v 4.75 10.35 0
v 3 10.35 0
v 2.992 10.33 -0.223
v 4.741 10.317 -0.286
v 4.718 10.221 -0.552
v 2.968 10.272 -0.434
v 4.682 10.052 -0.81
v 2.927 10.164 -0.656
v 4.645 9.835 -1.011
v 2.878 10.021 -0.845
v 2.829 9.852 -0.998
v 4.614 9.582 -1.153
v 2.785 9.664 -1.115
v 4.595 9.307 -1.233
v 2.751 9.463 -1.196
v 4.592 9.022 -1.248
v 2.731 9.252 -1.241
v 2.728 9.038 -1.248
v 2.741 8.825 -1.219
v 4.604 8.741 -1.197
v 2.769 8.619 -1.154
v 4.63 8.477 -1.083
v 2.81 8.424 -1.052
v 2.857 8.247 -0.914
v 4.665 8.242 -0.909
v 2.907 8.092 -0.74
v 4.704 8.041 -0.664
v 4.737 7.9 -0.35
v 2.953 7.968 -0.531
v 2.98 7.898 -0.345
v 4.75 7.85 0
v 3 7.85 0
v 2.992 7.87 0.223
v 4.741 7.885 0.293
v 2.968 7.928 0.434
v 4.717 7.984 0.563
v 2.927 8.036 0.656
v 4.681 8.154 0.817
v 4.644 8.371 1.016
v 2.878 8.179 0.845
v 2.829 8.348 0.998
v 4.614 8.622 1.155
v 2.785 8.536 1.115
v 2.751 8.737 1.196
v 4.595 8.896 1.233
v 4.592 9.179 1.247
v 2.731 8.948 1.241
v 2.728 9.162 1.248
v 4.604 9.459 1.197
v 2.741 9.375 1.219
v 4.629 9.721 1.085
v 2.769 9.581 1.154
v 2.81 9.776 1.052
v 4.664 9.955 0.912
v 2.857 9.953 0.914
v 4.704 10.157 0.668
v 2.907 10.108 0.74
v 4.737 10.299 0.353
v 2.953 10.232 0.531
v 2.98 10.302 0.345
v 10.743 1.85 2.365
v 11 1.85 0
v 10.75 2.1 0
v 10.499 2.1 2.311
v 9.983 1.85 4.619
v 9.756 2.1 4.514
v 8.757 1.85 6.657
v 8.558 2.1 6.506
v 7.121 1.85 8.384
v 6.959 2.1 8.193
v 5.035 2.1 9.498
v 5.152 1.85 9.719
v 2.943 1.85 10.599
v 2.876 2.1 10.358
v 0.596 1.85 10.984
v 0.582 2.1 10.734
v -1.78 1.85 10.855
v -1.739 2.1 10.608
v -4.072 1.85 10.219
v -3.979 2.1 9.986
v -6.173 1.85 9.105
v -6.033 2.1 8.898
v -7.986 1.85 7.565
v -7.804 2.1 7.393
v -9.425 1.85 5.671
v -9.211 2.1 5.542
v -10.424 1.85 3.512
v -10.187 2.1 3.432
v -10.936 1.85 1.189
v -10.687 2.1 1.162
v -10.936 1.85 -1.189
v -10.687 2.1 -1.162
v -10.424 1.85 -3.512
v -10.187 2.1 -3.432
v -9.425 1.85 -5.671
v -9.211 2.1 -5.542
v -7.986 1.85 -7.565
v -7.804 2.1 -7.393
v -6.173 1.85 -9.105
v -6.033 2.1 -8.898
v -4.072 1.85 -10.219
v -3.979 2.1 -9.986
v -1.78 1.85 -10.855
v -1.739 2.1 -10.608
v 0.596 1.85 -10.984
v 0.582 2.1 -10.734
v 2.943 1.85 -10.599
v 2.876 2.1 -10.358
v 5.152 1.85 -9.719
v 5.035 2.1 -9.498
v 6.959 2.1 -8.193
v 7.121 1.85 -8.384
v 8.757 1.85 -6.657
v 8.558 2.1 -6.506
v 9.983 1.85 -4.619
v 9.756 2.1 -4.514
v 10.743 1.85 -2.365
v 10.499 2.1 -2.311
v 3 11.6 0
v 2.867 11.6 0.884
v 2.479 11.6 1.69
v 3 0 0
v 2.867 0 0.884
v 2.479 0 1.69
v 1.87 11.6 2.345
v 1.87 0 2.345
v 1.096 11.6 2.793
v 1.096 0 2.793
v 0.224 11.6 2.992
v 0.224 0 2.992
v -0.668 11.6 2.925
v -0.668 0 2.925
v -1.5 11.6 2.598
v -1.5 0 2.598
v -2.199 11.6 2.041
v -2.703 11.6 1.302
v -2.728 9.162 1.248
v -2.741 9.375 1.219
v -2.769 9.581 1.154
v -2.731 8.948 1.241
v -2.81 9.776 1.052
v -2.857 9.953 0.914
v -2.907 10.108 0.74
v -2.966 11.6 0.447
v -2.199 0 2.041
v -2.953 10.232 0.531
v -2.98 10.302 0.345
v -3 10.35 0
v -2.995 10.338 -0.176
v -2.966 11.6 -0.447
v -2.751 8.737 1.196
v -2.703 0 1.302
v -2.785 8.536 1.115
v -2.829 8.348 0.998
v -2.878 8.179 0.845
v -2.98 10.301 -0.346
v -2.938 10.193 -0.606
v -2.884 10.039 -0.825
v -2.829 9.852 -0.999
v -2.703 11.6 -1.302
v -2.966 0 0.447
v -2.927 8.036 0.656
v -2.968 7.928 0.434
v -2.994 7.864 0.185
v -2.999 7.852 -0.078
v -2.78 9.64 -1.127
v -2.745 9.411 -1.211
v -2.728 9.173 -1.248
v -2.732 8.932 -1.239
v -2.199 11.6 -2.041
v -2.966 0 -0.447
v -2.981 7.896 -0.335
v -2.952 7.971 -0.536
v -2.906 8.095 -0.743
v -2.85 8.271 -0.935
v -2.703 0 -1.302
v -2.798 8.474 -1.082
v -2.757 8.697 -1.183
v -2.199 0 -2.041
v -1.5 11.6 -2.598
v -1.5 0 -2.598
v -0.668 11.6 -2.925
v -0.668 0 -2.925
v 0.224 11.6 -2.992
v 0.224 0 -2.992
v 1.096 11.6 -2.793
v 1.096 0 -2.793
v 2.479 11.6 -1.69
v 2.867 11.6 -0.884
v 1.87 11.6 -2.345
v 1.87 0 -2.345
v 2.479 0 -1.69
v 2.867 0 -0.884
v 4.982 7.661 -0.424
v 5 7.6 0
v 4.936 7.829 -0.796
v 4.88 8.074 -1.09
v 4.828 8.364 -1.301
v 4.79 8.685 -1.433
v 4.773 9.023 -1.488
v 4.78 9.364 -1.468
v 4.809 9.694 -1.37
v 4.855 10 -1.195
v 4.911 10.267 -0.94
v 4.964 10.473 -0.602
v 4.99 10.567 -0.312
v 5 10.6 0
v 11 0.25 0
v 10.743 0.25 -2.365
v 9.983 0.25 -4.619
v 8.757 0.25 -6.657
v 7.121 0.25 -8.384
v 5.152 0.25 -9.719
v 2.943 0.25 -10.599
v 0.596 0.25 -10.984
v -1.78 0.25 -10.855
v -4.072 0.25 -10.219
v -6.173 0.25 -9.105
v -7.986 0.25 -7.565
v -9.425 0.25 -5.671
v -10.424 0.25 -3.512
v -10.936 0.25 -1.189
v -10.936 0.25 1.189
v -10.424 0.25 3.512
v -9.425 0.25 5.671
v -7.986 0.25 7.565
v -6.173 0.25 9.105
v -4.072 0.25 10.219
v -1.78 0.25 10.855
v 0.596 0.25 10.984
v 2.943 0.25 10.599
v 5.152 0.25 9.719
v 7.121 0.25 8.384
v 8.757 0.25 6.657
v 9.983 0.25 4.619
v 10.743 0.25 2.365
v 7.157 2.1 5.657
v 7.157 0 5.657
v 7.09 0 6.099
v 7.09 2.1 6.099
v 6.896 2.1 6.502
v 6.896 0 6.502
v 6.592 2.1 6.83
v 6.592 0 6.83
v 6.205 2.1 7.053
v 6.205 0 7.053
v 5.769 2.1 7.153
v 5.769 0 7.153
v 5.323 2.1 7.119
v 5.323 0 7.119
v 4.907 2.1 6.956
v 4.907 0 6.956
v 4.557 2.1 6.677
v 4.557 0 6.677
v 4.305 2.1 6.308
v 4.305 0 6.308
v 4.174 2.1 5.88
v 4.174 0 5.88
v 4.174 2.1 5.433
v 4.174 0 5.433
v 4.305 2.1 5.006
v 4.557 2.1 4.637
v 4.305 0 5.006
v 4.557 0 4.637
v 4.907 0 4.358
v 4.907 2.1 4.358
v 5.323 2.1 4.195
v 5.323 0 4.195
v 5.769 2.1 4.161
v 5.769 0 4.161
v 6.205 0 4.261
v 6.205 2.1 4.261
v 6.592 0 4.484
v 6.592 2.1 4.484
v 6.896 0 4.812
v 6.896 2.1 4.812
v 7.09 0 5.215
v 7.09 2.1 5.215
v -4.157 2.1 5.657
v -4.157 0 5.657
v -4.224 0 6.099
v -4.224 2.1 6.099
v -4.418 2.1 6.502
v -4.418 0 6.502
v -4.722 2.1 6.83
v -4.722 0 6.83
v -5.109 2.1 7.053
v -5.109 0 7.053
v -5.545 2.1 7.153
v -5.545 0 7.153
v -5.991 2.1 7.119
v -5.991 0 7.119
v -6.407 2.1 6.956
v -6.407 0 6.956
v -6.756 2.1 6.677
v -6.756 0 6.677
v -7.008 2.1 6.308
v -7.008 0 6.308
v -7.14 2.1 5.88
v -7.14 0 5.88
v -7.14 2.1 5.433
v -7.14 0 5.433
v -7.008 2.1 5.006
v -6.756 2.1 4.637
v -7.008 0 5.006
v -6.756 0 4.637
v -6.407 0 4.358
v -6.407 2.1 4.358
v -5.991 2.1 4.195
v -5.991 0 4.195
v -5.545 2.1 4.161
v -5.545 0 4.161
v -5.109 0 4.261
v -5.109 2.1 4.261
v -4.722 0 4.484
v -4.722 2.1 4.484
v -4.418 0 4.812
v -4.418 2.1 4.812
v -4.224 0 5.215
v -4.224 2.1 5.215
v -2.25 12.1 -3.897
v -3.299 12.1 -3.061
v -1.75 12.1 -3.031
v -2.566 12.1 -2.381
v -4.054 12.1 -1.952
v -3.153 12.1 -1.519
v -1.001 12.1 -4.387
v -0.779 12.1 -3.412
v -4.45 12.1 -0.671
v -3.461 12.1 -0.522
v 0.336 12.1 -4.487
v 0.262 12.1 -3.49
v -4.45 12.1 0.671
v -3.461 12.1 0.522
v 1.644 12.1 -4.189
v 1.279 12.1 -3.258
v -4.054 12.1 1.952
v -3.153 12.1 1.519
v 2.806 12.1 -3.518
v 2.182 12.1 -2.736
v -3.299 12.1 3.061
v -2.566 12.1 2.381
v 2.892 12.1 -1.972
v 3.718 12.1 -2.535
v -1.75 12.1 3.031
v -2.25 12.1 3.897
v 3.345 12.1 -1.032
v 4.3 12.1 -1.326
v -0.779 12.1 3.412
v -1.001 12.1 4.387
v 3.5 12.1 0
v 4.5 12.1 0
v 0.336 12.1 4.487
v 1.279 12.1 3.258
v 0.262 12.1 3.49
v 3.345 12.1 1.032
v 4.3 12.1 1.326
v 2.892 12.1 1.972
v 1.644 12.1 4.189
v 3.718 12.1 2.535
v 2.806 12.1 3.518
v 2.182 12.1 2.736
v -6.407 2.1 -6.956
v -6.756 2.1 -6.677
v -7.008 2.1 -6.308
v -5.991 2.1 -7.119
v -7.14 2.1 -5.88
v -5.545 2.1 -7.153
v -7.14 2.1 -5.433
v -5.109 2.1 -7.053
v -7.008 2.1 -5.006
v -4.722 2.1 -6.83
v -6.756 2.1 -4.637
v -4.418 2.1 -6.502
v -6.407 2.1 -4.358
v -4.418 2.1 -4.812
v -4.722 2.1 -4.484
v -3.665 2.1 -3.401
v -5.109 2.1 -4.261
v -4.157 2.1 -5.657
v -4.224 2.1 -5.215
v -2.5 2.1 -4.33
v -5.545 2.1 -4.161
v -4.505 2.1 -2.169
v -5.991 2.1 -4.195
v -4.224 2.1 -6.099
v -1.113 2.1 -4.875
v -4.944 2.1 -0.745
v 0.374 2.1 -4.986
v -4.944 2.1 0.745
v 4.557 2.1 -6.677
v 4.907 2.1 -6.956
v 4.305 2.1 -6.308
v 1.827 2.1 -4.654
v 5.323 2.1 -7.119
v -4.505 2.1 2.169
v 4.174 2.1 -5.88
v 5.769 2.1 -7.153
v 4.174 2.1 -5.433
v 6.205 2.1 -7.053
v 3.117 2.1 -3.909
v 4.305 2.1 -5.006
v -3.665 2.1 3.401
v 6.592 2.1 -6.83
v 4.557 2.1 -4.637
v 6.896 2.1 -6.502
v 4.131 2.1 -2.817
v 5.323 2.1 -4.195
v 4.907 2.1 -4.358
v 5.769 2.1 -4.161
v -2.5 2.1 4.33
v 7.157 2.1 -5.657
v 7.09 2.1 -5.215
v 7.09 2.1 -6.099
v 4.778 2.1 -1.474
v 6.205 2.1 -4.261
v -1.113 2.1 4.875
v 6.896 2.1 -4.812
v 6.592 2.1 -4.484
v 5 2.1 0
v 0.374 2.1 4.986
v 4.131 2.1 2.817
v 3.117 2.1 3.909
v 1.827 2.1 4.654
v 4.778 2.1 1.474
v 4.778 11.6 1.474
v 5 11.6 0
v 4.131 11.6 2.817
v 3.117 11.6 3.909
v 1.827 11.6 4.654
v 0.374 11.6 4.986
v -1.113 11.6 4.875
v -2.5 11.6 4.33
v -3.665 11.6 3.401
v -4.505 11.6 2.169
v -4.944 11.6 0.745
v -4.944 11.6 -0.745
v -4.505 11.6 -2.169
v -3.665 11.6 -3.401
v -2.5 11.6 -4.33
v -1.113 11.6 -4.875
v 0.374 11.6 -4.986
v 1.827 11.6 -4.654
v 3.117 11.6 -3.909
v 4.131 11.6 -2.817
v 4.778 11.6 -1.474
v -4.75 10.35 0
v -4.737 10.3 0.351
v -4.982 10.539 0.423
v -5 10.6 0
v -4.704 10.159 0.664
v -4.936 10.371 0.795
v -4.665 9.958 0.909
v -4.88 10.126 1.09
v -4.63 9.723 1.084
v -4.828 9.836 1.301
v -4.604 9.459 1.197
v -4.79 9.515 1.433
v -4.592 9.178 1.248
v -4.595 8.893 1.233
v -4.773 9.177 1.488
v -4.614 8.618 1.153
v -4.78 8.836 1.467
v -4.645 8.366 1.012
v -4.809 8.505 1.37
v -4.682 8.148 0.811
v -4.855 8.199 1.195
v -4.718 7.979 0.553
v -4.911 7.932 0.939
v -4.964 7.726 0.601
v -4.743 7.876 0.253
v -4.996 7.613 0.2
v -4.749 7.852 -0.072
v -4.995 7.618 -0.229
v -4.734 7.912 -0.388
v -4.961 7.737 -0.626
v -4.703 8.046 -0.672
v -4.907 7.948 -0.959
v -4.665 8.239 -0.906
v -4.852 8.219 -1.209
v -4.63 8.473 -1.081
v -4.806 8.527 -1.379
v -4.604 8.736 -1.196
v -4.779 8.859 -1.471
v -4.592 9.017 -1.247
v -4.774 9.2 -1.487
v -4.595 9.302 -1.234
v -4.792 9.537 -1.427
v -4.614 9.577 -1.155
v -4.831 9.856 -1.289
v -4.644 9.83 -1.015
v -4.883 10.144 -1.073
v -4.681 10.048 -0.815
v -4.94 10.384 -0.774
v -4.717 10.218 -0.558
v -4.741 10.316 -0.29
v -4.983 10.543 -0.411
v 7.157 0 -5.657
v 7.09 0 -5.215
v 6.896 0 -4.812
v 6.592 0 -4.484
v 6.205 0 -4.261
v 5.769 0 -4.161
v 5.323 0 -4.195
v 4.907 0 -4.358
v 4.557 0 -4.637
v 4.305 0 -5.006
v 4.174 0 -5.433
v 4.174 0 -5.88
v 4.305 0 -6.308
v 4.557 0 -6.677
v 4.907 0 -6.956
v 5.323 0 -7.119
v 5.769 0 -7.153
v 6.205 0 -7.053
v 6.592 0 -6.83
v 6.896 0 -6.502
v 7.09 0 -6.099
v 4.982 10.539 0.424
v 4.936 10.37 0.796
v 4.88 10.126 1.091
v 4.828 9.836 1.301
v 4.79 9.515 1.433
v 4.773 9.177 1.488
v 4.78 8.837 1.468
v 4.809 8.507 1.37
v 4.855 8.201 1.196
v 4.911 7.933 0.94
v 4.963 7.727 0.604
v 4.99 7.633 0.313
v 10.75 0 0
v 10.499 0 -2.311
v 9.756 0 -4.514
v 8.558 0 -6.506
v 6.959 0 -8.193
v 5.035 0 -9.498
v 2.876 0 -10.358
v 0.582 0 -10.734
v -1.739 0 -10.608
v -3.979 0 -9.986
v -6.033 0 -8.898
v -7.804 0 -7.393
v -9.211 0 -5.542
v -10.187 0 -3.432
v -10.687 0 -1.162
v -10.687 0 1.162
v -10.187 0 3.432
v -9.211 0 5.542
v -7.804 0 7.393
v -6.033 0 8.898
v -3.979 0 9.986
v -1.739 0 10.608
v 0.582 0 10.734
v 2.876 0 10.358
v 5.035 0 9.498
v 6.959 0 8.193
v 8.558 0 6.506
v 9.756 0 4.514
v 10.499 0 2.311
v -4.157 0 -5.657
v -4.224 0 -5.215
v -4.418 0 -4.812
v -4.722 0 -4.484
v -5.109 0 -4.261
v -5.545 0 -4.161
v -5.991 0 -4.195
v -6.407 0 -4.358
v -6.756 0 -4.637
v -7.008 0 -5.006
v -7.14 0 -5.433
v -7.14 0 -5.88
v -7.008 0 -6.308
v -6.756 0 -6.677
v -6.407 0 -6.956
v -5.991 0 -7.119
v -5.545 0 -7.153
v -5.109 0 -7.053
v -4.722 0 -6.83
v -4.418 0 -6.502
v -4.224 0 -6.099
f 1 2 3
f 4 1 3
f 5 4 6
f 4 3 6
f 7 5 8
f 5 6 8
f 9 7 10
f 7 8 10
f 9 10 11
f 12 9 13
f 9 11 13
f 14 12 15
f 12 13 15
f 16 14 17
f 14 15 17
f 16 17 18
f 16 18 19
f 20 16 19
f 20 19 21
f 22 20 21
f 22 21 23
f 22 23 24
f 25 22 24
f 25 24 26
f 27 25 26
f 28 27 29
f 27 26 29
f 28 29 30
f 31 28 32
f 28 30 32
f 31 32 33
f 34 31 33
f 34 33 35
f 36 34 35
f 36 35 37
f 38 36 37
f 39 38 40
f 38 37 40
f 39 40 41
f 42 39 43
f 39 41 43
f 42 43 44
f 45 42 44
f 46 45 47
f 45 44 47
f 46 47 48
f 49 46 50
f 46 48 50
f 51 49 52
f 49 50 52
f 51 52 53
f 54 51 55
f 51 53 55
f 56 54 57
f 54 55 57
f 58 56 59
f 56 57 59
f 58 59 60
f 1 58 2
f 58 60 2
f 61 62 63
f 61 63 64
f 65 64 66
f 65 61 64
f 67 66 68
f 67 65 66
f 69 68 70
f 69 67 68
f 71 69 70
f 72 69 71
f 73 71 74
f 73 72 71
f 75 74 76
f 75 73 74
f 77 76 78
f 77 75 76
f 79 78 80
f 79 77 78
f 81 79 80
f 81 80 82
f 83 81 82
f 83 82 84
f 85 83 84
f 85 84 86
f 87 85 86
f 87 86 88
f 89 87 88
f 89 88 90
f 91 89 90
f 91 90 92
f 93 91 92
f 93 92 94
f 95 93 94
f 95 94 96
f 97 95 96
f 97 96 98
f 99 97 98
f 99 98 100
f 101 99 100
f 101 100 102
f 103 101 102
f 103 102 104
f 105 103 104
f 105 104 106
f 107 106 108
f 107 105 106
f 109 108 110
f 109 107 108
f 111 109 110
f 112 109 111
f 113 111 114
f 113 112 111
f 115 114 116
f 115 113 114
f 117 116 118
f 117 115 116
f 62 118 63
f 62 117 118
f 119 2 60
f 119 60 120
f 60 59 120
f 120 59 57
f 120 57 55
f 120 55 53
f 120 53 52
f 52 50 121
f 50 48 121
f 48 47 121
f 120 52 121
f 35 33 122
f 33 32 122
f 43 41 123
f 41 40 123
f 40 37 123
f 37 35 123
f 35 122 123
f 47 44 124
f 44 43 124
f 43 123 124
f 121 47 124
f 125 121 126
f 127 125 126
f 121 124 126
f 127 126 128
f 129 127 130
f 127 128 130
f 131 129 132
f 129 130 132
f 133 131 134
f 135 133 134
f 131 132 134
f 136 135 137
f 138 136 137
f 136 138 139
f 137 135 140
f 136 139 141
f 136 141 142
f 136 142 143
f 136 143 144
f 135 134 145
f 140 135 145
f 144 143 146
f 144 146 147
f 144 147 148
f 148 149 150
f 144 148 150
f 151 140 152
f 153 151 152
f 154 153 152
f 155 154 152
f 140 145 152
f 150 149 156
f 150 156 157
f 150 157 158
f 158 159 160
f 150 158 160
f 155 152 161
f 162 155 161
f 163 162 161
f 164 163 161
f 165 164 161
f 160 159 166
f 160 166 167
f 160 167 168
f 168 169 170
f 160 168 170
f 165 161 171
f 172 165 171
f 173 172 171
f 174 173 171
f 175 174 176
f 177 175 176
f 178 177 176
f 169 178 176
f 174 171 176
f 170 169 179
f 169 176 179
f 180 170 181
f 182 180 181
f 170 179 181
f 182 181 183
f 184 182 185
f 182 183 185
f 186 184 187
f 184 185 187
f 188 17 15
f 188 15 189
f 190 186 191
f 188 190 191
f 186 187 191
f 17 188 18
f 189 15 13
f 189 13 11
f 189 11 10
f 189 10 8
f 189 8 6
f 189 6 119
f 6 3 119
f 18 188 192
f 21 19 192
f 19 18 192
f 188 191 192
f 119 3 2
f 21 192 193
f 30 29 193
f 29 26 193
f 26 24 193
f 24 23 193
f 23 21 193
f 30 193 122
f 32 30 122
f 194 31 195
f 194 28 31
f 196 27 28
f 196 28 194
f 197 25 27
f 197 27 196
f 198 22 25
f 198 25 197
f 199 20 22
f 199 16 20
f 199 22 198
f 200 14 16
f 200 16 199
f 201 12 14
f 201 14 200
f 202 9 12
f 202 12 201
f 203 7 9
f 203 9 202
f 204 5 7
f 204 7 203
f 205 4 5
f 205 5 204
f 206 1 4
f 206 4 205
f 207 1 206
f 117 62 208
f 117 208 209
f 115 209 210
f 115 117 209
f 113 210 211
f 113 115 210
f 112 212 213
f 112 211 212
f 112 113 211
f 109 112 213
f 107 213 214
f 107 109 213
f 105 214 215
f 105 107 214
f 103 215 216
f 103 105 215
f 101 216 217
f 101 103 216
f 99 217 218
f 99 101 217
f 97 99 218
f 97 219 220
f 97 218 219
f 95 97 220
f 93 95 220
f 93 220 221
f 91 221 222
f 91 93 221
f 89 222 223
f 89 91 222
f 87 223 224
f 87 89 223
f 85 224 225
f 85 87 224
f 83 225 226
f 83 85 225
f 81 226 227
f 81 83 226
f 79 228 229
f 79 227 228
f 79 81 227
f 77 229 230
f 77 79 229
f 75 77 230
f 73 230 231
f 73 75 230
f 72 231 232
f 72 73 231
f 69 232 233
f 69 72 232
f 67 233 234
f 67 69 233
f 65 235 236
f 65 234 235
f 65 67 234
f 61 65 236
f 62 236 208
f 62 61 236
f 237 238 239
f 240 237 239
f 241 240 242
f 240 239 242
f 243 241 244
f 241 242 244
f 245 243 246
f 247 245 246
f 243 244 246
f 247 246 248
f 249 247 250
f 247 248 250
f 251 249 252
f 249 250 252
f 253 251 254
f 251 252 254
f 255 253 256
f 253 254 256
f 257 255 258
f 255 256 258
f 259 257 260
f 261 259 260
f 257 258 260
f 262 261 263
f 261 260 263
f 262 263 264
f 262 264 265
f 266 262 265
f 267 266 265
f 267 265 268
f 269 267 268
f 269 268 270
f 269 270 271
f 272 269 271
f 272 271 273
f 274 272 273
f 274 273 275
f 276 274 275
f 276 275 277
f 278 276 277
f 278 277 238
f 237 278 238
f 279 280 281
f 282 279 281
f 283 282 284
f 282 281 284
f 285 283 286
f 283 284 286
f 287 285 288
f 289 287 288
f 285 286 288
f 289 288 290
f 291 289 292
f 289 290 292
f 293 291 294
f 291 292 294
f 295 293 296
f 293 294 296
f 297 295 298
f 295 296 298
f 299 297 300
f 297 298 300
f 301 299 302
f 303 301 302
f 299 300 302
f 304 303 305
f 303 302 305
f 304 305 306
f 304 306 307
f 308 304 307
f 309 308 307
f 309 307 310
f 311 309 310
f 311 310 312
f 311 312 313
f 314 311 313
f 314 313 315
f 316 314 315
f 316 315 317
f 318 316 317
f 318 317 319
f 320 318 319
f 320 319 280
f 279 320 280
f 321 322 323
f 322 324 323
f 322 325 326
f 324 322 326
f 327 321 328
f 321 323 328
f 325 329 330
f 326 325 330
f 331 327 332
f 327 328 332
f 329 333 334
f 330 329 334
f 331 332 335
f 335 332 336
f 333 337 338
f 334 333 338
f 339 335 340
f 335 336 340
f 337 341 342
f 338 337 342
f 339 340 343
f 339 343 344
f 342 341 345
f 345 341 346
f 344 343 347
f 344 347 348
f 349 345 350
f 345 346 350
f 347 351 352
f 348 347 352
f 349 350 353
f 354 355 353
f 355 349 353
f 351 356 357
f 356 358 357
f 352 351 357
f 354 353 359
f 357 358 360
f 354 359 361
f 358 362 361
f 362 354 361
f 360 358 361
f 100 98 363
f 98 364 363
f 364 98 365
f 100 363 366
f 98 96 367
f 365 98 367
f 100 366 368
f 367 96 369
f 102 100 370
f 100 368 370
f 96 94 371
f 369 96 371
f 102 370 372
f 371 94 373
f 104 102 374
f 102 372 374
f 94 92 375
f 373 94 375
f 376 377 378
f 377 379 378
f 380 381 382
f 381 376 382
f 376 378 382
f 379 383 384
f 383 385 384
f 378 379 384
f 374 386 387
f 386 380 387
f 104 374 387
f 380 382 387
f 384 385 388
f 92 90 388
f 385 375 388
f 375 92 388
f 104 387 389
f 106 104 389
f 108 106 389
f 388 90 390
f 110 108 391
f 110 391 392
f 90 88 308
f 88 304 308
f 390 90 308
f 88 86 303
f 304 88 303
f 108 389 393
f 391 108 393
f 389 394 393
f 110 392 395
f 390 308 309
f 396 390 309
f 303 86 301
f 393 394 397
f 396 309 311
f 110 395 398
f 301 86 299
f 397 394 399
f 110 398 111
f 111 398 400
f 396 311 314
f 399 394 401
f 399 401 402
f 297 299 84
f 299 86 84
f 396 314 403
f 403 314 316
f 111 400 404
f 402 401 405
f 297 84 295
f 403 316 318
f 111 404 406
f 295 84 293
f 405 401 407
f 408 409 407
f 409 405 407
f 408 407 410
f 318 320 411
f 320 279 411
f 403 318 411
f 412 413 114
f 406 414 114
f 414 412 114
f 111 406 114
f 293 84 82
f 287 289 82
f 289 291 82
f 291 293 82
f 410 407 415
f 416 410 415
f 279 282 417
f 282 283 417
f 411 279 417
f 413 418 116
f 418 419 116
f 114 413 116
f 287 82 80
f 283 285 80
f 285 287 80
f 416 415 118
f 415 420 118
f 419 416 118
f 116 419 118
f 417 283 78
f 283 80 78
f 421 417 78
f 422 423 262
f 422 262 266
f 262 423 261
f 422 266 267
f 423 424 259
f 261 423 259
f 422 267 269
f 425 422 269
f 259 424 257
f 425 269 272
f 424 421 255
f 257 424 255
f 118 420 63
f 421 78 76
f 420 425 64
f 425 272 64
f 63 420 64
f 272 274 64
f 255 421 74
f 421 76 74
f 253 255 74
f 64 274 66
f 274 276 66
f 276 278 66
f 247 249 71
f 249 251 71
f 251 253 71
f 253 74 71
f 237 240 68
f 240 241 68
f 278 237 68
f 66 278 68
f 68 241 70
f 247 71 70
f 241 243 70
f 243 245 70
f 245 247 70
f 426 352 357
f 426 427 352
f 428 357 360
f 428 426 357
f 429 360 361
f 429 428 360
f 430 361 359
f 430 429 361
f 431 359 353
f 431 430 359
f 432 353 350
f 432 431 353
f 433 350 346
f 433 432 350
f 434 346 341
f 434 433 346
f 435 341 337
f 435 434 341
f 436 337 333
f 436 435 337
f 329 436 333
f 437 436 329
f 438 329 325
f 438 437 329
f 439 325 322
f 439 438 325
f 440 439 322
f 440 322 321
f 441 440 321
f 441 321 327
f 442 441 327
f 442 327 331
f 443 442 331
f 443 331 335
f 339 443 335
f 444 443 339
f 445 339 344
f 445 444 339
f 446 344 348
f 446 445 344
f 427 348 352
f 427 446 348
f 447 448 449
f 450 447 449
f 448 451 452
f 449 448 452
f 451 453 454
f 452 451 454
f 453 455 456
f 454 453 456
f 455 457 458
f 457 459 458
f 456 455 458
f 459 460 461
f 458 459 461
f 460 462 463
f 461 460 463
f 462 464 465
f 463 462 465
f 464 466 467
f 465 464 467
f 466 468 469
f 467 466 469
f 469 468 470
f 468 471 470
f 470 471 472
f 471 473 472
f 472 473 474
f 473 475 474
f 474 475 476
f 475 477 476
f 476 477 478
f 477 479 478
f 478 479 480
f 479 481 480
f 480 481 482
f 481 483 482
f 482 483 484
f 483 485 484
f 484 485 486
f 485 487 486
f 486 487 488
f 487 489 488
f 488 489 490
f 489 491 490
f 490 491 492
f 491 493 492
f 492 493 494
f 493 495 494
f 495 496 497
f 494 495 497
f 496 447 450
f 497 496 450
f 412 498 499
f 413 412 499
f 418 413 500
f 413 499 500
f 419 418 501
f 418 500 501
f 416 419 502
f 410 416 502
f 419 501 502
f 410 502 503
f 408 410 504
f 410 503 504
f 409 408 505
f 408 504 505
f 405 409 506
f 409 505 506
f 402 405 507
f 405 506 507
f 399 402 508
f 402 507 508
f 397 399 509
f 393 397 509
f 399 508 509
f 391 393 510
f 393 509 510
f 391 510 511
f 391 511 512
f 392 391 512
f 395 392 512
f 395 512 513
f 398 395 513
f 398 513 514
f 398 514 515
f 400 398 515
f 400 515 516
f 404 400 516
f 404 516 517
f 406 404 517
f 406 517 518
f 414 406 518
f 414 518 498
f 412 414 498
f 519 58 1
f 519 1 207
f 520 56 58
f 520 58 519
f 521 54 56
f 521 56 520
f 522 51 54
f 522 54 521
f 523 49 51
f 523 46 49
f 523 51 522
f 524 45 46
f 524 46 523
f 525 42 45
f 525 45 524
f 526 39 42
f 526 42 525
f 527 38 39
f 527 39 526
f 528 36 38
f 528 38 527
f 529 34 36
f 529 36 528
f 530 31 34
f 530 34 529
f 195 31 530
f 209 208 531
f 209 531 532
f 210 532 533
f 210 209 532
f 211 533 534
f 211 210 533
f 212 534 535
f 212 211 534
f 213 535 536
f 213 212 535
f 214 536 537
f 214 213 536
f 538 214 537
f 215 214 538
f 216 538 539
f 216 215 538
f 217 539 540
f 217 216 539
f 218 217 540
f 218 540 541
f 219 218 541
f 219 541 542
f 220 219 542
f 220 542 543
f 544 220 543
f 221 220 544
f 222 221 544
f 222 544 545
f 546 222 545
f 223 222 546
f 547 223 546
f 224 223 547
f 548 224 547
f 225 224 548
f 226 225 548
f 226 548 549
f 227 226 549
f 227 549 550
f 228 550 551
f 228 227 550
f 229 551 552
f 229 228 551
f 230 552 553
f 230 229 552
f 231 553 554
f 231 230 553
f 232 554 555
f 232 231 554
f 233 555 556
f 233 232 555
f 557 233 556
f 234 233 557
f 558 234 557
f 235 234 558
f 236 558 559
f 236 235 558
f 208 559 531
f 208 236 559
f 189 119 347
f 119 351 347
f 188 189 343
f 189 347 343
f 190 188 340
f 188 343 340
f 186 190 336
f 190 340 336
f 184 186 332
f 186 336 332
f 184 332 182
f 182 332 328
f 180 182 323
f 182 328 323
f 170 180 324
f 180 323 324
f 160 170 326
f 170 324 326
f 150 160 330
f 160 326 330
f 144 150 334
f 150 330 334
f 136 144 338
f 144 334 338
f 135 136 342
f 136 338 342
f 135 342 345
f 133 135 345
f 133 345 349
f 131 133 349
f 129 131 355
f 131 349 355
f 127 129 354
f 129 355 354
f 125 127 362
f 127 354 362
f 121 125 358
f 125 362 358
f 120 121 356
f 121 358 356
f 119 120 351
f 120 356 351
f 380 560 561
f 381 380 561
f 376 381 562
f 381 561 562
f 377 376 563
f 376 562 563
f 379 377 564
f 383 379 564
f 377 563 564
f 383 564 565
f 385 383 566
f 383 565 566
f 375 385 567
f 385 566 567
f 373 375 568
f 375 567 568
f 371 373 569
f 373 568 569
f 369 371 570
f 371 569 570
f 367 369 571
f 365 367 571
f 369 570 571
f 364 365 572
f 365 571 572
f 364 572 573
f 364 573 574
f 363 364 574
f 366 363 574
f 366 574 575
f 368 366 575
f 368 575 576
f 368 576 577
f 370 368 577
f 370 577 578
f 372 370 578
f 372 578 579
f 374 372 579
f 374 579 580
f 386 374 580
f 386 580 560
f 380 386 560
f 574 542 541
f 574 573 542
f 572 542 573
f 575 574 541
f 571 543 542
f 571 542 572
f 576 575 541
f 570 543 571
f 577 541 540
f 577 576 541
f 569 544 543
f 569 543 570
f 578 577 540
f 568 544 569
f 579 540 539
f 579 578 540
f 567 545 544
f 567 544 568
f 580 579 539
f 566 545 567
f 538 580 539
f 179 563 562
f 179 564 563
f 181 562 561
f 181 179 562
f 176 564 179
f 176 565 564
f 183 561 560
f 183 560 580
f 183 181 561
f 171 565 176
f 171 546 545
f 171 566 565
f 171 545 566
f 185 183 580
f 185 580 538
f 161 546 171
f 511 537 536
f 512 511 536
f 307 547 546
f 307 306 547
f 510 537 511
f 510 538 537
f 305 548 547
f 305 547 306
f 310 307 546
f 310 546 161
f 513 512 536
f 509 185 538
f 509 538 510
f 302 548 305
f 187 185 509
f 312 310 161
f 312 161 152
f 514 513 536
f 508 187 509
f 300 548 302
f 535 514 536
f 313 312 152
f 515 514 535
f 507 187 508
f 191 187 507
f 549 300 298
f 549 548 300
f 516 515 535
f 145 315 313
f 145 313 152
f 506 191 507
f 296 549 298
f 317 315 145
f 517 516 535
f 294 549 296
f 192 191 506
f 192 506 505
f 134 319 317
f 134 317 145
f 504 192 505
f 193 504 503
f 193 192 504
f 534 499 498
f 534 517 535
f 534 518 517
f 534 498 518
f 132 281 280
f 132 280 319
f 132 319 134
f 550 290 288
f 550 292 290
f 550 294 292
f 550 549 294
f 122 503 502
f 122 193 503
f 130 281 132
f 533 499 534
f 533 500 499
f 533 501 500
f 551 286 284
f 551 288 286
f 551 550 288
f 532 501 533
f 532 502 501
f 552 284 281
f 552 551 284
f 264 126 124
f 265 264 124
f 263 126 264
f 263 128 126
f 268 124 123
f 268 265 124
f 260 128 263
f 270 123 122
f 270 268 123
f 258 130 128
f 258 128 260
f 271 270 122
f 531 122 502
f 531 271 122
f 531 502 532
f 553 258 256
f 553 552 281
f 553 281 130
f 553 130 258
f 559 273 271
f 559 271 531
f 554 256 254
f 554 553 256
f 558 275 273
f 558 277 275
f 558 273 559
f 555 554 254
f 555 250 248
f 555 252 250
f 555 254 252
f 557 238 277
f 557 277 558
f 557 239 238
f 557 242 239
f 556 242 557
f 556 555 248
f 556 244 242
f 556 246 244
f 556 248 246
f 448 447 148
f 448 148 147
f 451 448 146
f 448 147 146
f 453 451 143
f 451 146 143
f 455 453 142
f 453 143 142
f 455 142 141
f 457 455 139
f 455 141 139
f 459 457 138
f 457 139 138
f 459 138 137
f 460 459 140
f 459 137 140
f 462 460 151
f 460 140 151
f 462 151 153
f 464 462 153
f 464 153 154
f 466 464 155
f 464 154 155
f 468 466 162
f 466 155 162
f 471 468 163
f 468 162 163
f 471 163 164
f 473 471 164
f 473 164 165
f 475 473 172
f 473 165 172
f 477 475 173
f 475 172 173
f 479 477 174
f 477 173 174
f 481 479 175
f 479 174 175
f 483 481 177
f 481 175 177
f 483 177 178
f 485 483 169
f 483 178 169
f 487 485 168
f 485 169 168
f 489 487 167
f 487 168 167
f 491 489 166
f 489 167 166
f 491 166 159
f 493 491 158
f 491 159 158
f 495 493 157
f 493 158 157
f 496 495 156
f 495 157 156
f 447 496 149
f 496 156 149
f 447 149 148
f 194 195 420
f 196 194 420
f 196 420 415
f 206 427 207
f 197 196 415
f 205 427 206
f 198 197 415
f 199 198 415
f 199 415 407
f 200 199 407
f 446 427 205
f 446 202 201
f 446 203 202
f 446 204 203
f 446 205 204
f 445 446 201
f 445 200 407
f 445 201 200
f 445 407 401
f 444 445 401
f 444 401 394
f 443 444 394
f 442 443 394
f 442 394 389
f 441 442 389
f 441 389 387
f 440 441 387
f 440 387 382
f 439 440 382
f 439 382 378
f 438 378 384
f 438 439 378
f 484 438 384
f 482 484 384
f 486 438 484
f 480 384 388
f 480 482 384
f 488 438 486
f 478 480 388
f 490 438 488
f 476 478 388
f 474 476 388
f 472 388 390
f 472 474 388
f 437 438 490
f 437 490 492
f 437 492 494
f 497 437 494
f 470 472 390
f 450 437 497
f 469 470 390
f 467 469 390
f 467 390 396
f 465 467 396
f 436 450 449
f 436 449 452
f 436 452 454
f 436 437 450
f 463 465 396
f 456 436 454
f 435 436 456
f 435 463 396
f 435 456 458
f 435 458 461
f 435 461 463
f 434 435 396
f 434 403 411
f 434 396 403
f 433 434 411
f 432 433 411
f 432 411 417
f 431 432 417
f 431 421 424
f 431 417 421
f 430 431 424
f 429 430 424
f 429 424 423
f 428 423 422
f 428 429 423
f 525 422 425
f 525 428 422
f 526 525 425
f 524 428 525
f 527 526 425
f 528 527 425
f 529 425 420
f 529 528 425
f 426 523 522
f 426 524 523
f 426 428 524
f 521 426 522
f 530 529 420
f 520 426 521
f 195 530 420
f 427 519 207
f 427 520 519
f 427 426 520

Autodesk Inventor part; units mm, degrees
ref_plane "YZ Plane" through (0, 0, 0) normal (1, 0, 0) x (0, 1, 0)
ref_plane "XZ Plane" through (0, 0, 0) normal (0, 1, 0) x (-1, 0, 0)
ref_plane "XY Plane" through (0, 0, 0) normal (0, 0, 1) x (1, 0, 0)
sketch "Sketch1" plane through (0, 0, 0) normal (0, 0, 1) x (1, 0, 0)
  line L0 (0, 0) -> (11, 0)
  line L1 (11, 0) -> (11, 2.1)
  line L2 (11, 2.1) -> (0, 2.1)
  line L3 (0, 2.1) -> (0, 0)
  line L4 (0, 0) -> (5, 0)
  line L5 (5, 0) -> (5, 12.1)
  line L6 (5, 12.1) -> (0, 12.1)
  line L7 (0, 12.1) -> (0, 0)
  line L8 (0, 12.1) -> (3, 12.1)
  line L9 (3, 12.1) -> (3, 0)
  line L10 (3, 0) -> (0, 0)
  line L11 (0, 0) -> (0, 12.1)
  point P0 (3, 0)
  point P1 (5, 2.1)
  dimension "d0" = 11
  dimension "d1" = 2.1
  dimension "d2" = 5
  dimension "d3" = 12.1
  dimension "d4" = 3
revolve "Revolution1" add sketch "Sketch1" angle 360 about axis through (0, 12.1, 0) along (0, -1, 0) contours L9 L2 L5 L0 | L5 L2 L1 L0 | L9 L6 L5 L2
sketch "Sketch2" plane through (0, 0, 0) normal (0, -1, 0) x (1, 0, 0)
  circle A0 centre (0, 0) radius 8 construction
  line L0 (0, 0) -> (8, 0) construction
  circle A1 centre (8, 0) radius 1.5
  circle A2 centre (5.6569, 5.6569) radius 1.5
  circle A3 centre (0, 8) radius 1.5
  circle A4 centre (-5.6569, 5.6569) radius 1.5
  circle A5 centre (-8, 0) radius 1.5
  circle A6 centre (-5.6569, -5.6569) radius 1.5
  circle A7 centre (0, -8) radius 1.5
  circle A8 centre (5.6569, -5.6569) radius 1.5
  dimension "d6" = 16
  dimension "d7" = 3
  dimension "d10" = 360
extrude "Extrusion1" cut sketch "Sketch2" against normal through all contours A2 | A4 | A6 | A8
sketch "Sketch3" plane through (0, 0, 0) normal (1, 0, 0) x (0, 1, 0)
  line L0 (12.1, 5) -> (12.1, -5) projected
  line L1 (12.1, 0) -> (0, 0) construction
  circle A0 centre (9.1, 0) radius 1.25
  dimension "d14" = 2.5
  dimension "d15" = 3
extrude "Extrusion2" cut sketch "Sketch3" along normal through all both and the other way through all
chamfer "Chamfer1" distance 0.5 angle 45 2 edges at (-5, 12.1, 0) (-3, 12.1, 0)
chamfer "Chamfer2" distance 0.25 angle 45 5 edges at (-11, 0, 0) (-11, 2.1, 0) (4.8412, 9.0999, -1.25) (4.8412, 9.1, 1.25) (-5, 7.85, -0.0003)
properties part number "Hubs - 6mm" material "Stainless Steel"
